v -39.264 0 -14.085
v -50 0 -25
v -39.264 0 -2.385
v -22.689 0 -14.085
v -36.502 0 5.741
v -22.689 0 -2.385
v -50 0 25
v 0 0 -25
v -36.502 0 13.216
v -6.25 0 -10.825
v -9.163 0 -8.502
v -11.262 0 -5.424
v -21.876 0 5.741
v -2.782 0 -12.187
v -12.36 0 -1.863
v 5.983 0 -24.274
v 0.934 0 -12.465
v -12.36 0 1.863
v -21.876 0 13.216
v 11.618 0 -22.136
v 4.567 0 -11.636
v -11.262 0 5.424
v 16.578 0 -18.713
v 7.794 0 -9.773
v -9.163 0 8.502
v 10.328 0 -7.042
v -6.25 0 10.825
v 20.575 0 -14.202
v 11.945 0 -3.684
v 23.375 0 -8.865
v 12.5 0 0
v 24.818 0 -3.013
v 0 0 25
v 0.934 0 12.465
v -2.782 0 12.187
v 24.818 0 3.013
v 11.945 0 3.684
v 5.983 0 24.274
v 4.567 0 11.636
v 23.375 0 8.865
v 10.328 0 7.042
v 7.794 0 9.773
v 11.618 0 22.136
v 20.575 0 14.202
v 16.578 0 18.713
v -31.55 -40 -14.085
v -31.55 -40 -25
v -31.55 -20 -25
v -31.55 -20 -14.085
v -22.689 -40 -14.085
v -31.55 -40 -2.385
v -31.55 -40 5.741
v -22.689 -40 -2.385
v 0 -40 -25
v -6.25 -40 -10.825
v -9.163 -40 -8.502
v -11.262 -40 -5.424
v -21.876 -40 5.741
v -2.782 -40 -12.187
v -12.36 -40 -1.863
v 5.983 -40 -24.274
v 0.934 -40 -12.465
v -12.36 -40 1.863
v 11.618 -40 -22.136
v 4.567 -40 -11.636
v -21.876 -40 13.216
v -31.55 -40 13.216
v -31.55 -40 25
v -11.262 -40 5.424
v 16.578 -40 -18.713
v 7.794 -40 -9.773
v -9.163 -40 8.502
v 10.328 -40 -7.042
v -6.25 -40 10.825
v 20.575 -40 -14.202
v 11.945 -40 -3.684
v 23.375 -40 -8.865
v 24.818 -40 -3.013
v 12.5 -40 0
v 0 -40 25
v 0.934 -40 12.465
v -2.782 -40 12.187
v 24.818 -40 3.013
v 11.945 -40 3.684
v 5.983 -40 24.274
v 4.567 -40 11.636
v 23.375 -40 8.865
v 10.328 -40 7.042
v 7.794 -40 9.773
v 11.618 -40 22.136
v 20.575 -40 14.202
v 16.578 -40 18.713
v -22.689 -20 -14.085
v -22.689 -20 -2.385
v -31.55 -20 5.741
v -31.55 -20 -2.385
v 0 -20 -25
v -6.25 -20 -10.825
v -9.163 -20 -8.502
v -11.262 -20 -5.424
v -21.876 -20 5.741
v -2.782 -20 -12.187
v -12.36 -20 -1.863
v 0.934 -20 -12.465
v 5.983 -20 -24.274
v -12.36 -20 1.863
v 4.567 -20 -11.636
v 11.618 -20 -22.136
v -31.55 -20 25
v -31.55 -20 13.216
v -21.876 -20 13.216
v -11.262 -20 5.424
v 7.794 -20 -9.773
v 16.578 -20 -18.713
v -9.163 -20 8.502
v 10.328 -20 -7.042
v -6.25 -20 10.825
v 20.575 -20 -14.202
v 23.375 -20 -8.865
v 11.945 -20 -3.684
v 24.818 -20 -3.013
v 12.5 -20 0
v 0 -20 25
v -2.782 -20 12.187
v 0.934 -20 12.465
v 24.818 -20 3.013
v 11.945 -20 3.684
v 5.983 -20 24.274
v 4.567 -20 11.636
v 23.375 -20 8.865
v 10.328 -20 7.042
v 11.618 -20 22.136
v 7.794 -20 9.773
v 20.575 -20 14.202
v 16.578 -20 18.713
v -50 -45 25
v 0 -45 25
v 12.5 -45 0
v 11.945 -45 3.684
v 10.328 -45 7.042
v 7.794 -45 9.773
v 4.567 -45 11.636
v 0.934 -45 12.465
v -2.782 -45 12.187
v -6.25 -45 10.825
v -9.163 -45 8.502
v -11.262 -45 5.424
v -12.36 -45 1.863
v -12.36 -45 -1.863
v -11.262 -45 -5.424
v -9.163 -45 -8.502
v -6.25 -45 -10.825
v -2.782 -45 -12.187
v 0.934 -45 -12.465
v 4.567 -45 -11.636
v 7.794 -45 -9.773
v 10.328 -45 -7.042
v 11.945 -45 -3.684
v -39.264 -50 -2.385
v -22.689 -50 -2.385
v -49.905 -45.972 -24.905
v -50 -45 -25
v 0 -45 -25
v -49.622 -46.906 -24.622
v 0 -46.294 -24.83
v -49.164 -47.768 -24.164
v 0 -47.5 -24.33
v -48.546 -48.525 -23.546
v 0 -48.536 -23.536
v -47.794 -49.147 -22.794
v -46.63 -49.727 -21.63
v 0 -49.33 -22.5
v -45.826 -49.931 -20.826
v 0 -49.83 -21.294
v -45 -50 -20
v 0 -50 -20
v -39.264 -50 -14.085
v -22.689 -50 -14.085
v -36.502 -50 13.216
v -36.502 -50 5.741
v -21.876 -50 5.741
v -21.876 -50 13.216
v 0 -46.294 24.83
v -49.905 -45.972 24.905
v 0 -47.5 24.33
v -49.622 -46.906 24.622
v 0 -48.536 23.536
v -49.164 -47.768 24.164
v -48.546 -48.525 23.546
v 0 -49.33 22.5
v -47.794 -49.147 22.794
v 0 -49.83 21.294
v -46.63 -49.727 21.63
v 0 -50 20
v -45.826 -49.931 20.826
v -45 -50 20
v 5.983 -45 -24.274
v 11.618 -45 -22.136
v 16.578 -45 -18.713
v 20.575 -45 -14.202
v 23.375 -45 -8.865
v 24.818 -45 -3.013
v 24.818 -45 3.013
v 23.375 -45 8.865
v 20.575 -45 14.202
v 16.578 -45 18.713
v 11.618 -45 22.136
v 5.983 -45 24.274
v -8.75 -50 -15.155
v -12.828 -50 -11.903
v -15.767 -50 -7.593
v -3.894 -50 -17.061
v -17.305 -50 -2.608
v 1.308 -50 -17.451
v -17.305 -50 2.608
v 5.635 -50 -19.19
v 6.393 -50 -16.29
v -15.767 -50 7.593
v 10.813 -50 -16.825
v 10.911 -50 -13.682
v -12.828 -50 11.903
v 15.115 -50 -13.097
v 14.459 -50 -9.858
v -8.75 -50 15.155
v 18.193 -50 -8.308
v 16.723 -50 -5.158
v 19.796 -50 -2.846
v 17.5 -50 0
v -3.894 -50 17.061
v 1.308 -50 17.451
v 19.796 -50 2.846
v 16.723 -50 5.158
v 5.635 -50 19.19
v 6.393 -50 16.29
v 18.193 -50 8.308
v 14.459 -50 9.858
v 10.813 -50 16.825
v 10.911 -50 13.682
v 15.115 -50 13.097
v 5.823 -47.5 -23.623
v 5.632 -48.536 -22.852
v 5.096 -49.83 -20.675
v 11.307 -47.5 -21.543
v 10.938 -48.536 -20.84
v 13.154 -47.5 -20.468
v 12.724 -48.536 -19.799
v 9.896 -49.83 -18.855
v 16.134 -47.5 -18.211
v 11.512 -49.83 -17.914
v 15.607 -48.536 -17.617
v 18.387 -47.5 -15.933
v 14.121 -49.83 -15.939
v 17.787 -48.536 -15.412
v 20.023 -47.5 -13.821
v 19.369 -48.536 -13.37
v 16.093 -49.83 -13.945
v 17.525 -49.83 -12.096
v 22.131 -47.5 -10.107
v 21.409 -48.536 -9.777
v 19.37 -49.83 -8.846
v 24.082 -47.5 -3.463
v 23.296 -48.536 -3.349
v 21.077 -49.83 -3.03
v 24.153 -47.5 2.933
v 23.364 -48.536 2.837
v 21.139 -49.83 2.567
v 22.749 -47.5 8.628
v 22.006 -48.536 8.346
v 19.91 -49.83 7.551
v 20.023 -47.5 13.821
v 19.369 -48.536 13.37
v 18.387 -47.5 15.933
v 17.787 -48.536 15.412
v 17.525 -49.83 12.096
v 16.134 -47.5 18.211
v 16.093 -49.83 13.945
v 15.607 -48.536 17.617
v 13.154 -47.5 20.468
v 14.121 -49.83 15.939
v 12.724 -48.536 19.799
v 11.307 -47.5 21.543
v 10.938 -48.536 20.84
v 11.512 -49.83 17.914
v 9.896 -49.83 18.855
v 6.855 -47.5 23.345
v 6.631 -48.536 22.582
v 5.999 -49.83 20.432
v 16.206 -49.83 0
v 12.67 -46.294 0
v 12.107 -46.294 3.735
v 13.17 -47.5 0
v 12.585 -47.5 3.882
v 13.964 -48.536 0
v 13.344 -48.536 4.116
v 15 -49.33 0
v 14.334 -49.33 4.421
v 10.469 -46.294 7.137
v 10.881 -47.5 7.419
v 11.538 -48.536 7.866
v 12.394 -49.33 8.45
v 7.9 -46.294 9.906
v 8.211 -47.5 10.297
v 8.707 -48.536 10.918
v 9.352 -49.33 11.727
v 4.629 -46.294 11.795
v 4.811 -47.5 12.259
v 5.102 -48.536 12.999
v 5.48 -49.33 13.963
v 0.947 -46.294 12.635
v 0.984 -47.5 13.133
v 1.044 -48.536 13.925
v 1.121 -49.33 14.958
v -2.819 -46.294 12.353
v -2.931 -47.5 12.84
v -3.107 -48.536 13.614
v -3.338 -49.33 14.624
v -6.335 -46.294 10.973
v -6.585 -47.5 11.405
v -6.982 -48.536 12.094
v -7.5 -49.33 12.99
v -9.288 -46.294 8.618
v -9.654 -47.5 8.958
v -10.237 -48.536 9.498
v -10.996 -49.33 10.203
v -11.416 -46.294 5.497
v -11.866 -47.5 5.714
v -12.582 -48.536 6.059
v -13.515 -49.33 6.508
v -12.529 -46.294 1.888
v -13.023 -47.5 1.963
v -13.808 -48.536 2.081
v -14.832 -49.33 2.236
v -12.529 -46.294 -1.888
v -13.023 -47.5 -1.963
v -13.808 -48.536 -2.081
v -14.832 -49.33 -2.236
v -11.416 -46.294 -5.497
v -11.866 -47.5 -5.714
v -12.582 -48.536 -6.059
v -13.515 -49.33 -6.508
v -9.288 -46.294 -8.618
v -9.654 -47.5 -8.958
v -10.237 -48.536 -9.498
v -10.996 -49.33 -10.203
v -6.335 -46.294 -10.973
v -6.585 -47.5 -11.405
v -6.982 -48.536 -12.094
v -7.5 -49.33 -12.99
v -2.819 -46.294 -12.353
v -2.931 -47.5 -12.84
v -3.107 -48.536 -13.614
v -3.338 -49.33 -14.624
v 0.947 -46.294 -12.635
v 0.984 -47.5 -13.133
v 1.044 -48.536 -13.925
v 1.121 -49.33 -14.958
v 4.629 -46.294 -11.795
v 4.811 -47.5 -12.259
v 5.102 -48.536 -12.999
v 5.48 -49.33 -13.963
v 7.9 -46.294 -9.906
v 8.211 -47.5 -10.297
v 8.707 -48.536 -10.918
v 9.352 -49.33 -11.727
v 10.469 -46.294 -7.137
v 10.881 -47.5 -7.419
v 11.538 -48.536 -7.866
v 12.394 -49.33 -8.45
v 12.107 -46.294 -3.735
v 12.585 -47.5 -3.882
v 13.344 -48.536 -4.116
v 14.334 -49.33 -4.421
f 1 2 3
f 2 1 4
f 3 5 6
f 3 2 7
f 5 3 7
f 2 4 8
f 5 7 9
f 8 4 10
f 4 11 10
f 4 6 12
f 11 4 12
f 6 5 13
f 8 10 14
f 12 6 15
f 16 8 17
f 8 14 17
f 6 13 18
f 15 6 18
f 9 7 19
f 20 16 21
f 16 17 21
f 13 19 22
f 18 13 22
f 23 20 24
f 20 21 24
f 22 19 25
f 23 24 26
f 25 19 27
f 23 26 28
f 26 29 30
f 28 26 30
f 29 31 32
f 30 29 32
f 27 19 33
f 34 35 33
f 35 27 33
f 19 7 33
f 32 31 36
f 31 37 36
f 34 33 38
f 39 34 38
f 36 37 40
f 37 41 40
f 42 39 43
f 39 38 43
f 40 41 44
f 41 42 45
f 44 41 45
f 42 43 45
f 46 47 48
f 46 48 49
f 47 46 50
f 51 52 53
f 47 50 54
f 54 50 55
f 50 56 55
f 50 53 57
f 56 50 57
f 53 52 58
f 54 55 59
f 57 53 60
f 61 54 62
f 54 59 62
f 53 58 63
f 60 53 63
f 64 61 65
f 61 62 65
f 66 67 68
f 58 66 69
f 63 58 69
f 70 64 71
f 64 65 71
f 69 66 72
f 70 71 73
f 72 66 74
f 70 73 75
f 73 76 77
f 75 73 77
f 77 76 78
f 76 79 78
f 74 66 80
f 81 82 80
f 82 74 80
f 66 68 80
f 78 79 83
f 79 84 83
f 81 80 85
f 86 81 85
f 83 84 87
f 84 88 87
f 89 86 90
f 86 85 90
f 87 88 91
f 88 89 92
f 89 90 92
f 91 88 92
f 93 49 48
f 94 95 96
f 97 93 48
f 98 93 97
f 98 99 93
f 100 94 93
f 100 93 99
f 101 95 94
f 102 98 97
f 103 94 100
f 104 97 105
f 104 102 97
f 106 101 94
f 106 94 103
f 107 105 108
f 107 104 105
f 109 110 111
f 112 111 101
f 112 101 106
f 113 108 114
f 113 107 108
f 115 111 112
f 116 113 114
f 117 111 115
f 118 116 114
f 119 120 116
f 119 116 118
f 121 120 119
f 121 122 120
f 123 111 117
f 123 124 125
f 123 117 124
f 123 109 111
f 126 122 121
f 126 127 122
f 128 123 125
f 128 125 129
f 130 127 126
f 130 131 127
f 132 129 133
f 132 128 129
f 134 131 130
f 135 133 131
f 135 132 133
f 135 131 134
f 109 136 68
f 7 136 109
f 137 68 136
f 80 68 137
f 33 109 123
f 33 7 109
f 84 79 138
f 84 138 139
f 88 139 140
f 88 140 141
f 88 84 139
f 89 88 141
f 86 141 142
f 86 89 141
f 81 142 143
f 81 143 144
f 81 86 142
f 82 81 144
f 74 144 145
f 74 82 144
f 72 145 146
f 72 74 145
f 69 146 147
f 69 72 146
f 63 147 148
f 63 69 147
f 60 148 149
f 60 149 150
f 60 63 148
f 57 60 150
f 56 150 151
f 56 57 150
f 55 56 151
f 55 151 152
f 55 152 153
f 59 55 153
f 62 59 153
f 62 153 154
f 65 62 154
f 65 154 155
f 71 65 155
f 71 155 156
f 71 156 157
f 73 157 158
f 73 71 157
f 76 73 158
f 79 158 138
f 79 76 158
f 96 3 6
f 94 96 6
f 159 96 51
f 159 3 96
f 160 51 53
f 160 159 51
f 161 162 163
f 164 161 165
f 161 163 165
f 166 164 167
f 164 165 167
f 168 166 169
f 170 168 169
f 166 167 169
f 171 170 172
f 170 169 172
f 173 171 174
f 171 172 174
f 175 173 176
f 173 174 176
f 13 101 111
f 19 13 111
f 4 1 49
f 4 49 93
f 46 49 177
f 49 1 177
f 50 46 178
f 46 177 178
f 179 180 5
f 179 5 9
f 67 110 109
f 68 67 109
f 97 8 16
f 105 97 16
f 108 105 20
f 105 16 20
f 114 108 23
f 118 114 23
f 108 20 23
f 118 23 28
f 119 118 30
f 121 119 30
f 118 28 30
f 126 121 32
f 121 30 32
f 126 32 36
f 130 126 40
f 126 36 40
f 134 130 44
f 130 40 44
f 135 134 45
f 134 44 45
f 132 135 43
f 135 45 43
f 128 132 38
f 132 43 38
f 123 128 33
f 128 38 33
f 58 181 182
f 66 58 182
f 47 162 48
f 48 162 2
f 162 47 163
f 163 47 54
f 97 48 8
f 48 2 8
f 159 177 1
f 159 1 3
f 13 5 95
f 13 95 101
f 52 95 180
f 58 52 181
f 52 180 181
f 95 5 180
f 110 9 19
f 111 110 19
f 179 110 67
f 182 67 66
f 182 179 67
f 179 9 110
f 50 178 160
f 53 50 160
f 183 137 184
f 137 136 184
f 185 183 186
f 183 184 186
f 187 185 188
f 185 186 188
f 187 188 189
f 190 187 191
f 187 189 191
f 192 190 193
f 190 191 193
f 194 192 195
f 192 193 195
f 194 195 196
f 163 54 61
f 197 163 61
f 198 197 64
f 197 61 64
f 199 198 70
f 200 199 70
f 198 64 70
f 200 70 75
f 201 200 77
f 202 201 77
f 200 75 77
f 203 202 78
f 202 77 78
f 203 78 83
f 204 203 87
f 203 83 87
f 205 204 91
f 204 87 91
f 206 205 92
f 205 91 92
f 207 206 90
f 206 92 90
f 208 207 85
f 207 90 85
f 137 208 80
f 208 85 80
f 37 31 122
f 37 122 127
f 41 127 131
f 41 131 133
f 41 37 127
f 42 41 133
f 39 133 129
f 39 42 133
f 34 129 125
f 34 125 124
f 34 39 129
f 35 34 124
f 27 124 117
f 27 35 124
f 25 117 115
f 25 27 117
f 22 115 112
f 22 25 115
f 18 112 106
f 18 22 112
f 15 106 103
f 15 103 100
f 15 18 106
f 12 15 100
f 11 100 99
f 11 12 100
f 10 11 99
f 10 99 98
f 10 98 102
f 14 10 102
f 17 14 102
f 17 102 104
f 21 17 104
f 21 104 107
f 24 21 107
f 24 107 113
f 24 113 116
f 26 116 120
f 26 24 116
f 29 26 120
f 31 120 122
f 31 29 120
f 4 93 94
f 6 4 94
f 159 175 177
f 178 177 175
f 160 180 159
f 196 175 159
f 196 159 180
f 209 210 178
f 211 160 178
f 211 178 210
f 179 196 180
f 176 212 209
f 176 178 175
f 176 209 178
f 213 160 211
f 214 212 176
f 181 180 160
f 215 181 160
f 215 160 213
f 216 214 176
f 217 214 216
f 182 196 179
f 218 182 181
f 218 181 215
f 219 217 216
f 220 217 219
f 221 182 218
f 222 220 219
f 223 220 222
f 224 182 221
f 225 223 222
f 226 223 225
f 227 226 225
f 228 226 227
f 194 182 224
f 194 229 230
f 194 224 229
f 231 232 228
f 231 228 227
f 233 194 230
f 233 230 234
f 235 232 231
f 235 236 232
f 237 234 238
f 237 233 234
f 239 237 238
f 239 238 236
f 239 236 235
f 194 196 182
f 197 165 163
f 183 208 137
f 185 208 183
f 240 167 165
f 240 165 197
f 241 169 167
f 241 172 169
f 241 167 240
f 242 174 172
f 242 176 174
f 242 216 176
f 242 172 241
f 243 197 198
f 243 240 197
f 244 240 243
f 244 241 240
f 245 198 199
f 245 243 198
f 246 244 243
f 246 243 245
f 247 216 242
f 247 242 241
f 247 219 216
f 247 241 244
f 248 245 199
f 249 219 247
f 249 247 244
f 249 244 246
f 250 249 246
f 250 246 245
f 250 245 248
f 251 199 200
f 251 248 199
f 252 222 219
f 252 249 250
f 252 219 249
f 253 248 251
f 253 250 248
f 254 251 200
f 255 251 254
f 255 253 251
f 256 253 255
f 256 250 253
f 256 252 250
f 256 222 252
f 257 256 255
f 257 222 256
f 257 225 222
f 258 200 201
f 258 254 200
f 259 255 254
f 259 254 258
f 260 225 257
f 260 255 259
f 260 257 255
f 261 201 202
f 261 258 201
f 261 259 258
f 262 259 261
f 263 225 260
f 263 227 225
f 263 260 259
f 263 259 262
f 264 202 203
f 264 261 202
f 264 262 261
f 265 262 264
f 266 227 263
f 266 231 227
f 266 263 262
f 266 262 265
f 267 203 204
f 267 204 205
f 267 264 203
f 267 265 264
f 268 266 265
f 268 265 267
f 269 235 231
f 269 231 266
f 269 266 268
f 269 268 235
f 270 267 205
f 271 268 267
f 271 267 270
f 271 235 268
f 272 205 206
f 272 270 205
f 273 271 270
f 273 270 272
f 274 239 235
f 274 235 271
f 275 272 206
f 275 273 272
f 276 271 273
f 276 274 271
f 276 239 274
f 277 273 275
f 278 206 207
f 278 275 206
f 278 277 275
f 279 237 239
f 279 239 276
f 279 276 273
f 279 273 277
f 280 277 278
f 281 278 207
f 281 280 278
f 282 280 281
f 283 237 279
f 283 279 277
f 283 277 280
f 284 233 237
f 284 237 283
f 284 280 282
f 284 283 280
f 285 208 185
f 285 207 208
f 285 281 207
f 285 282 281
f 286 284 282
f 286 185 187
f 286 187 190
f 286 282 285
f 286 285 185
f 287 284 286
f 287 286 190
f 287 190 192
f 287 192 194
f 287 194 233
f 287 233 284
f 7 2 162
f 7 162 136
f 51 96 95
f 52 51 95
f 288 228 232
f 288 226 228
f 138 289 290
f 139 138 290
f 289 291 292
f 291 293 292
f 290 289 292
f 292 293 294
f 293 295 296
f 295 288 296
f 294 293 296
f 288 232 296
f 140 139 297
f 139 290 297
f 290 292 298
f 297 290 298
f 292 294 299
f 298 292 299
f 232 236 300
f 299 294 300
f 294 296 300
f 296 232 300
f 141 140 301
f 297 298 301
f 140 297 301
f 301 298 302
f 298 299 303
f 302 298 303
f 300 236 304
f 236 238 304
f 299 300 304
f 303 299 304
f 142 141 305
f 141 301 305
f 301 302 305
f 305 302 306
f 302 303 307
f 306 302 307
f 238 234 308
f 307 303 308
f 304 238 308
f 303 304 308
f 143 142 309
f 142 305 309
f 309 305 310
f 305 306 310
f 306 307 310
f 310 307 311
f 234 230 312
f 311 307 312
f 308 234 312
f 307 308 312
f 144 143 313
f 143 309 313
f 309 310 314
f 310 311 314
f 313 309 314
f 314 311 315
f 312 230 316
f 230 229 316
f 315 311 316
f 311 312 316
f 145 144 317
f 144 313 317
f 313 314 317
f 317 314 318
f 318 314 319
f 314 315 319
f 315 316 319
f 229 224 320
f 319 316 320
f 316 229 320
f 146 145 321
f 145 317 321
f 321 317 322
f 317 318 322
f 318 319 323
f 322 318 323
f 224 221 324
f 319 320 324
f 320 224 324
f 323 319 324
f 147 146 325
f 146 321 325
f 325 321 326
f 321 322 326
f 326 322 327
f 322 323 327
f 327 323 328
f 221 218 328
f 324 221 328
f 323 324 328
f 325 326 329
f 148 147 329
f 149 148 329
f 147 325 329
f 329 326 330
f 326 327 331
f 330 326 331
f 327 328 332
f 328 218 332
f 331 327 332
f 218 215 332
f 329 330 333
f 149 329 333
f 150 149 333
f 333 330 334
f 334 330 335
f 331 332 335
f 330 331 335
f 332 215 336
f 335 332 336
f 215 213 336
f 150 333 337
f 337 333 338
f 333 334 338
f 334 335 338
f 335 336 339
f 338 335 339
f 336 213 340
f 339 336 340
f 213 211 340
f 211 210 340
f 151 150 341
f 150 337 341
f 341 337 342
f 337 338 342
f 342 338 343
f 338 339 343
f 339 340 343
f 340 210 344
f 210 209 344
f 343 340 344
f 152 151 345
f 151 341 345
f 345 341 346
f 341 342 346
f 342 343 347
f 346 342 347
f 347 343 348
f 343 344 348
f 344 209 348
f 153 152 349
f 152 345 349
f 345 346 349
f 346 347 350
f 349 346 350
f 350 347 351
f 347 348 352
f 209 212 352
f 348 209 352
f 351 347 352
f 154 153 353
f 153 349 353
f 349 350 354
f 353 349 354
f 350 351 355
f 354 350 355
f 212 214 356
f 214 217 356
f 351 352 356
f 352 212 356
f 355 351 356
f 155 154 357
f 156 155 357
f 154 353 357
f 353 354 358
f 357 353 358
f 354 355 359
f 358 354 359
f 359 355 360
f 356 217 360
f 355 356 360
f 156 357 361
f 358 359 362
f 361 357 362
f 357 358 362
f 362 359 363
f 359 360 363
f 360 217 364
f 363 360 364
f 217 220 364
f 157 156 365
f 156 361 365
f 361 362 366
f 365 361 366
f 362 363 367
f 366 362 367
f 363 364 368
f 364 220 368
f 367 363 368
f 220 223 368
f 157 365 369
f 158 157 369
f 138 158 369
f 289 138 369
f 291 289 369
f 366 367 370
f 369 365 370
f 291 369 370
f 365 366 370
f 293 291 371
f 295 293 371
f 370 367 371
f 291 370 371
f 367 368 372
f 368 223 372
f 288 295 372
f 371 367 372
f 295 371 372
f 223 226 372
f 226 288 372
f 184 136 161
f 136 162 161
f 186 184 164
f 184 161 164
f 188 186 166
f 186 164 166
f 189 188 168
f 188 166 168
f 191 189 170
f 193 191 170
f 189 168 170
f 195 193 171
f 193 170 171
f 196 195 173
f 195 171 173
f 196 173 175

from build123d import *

# Parameters (mm, degrees)
F0_R     = 12.5
F1_DEPTH = 20
F3_R     = 12.5
F4_DEPTH = 10
F5_W     = 18.4501476586
F5_H     = 50
F6_DEPTH = 20
F7_R     = 5
F8_W     = 14.6253928542
F8_H     = 7.4752001092
F8_W_2   = 16.5754444897
F8_H_2   = 11.7003135383
F9_DEPTH = 50.001


with BuildPart() as f1:
    # F0 (on Front) → F1 (new body)
    with BuildSketch(Plane.XZ):
        with BuildLine():
            Line((-50, -25), (0, -25))
            ThreePointArc((0, -25), (25, 0), (0, 25))
            Line((0, 25), (-50, 25))
            Line((-50, 25), (-50, -25))
        make_face()
        Circle(F0_R, mode=Mode.SUBTRACT)
    extrude(amount=F1_DEPTH)



with BuildPart() as f4:
    # F3 (on offset) → F4 (new body)
    with BuildSketch(Plane.XZ.offset(40)):
        with BuildLine():
            Line((-50, 25), (-50, -25))
            Line((-50, -25), (0, -25))
            ThreePointArc((0, -25), (25, 0), (0, 25))
            Line((0, 25), (-50, 25))
        make_face()
        Circle(F3_R, mode=Mode.SUBTRACT)
    extrude(amount=F4_DEPTH)


with BuildPart() as f1_1:
    add(f1.part)

    add(f4.part)  # F6 merges F4
    # F5 (on face) → F6 (join, through all)
    with BuildSketch(Plane.XZ.offset(20)):
        with Locations((-40.7749261707, 0)):
            Rectangle(F5_W, F5_H)
    extrude(amount=F6_DEPTH)

    # F7
    f7_edges = [f1_1.edges().sort_by_distance(p)[0] for p in [
        (-25, -50, 25),
        (-50, -50, 0),
        (-25, -50, -25),
        (25, -50, 0),
        (-12.5, -50, 0),
    ]]
    fillet(f7_edges, radius=F7_R)

    # F8 (on face) → F9 (cut, through all)
    with BuildSketch(Plane.XZ.offset(50)):
        with Locations((-29.1888378561, 9.4781569205)):
            Rectangle(F8_W, F8_H)
        with Locations((-30.9763848782, -8.2348193973)):
            Rectangle(F8_W_2, F8_H_2)
    extrude(amount=-F9_DEPTH, mode=Mode.SUBTRACT)


solid = f1_1.part
